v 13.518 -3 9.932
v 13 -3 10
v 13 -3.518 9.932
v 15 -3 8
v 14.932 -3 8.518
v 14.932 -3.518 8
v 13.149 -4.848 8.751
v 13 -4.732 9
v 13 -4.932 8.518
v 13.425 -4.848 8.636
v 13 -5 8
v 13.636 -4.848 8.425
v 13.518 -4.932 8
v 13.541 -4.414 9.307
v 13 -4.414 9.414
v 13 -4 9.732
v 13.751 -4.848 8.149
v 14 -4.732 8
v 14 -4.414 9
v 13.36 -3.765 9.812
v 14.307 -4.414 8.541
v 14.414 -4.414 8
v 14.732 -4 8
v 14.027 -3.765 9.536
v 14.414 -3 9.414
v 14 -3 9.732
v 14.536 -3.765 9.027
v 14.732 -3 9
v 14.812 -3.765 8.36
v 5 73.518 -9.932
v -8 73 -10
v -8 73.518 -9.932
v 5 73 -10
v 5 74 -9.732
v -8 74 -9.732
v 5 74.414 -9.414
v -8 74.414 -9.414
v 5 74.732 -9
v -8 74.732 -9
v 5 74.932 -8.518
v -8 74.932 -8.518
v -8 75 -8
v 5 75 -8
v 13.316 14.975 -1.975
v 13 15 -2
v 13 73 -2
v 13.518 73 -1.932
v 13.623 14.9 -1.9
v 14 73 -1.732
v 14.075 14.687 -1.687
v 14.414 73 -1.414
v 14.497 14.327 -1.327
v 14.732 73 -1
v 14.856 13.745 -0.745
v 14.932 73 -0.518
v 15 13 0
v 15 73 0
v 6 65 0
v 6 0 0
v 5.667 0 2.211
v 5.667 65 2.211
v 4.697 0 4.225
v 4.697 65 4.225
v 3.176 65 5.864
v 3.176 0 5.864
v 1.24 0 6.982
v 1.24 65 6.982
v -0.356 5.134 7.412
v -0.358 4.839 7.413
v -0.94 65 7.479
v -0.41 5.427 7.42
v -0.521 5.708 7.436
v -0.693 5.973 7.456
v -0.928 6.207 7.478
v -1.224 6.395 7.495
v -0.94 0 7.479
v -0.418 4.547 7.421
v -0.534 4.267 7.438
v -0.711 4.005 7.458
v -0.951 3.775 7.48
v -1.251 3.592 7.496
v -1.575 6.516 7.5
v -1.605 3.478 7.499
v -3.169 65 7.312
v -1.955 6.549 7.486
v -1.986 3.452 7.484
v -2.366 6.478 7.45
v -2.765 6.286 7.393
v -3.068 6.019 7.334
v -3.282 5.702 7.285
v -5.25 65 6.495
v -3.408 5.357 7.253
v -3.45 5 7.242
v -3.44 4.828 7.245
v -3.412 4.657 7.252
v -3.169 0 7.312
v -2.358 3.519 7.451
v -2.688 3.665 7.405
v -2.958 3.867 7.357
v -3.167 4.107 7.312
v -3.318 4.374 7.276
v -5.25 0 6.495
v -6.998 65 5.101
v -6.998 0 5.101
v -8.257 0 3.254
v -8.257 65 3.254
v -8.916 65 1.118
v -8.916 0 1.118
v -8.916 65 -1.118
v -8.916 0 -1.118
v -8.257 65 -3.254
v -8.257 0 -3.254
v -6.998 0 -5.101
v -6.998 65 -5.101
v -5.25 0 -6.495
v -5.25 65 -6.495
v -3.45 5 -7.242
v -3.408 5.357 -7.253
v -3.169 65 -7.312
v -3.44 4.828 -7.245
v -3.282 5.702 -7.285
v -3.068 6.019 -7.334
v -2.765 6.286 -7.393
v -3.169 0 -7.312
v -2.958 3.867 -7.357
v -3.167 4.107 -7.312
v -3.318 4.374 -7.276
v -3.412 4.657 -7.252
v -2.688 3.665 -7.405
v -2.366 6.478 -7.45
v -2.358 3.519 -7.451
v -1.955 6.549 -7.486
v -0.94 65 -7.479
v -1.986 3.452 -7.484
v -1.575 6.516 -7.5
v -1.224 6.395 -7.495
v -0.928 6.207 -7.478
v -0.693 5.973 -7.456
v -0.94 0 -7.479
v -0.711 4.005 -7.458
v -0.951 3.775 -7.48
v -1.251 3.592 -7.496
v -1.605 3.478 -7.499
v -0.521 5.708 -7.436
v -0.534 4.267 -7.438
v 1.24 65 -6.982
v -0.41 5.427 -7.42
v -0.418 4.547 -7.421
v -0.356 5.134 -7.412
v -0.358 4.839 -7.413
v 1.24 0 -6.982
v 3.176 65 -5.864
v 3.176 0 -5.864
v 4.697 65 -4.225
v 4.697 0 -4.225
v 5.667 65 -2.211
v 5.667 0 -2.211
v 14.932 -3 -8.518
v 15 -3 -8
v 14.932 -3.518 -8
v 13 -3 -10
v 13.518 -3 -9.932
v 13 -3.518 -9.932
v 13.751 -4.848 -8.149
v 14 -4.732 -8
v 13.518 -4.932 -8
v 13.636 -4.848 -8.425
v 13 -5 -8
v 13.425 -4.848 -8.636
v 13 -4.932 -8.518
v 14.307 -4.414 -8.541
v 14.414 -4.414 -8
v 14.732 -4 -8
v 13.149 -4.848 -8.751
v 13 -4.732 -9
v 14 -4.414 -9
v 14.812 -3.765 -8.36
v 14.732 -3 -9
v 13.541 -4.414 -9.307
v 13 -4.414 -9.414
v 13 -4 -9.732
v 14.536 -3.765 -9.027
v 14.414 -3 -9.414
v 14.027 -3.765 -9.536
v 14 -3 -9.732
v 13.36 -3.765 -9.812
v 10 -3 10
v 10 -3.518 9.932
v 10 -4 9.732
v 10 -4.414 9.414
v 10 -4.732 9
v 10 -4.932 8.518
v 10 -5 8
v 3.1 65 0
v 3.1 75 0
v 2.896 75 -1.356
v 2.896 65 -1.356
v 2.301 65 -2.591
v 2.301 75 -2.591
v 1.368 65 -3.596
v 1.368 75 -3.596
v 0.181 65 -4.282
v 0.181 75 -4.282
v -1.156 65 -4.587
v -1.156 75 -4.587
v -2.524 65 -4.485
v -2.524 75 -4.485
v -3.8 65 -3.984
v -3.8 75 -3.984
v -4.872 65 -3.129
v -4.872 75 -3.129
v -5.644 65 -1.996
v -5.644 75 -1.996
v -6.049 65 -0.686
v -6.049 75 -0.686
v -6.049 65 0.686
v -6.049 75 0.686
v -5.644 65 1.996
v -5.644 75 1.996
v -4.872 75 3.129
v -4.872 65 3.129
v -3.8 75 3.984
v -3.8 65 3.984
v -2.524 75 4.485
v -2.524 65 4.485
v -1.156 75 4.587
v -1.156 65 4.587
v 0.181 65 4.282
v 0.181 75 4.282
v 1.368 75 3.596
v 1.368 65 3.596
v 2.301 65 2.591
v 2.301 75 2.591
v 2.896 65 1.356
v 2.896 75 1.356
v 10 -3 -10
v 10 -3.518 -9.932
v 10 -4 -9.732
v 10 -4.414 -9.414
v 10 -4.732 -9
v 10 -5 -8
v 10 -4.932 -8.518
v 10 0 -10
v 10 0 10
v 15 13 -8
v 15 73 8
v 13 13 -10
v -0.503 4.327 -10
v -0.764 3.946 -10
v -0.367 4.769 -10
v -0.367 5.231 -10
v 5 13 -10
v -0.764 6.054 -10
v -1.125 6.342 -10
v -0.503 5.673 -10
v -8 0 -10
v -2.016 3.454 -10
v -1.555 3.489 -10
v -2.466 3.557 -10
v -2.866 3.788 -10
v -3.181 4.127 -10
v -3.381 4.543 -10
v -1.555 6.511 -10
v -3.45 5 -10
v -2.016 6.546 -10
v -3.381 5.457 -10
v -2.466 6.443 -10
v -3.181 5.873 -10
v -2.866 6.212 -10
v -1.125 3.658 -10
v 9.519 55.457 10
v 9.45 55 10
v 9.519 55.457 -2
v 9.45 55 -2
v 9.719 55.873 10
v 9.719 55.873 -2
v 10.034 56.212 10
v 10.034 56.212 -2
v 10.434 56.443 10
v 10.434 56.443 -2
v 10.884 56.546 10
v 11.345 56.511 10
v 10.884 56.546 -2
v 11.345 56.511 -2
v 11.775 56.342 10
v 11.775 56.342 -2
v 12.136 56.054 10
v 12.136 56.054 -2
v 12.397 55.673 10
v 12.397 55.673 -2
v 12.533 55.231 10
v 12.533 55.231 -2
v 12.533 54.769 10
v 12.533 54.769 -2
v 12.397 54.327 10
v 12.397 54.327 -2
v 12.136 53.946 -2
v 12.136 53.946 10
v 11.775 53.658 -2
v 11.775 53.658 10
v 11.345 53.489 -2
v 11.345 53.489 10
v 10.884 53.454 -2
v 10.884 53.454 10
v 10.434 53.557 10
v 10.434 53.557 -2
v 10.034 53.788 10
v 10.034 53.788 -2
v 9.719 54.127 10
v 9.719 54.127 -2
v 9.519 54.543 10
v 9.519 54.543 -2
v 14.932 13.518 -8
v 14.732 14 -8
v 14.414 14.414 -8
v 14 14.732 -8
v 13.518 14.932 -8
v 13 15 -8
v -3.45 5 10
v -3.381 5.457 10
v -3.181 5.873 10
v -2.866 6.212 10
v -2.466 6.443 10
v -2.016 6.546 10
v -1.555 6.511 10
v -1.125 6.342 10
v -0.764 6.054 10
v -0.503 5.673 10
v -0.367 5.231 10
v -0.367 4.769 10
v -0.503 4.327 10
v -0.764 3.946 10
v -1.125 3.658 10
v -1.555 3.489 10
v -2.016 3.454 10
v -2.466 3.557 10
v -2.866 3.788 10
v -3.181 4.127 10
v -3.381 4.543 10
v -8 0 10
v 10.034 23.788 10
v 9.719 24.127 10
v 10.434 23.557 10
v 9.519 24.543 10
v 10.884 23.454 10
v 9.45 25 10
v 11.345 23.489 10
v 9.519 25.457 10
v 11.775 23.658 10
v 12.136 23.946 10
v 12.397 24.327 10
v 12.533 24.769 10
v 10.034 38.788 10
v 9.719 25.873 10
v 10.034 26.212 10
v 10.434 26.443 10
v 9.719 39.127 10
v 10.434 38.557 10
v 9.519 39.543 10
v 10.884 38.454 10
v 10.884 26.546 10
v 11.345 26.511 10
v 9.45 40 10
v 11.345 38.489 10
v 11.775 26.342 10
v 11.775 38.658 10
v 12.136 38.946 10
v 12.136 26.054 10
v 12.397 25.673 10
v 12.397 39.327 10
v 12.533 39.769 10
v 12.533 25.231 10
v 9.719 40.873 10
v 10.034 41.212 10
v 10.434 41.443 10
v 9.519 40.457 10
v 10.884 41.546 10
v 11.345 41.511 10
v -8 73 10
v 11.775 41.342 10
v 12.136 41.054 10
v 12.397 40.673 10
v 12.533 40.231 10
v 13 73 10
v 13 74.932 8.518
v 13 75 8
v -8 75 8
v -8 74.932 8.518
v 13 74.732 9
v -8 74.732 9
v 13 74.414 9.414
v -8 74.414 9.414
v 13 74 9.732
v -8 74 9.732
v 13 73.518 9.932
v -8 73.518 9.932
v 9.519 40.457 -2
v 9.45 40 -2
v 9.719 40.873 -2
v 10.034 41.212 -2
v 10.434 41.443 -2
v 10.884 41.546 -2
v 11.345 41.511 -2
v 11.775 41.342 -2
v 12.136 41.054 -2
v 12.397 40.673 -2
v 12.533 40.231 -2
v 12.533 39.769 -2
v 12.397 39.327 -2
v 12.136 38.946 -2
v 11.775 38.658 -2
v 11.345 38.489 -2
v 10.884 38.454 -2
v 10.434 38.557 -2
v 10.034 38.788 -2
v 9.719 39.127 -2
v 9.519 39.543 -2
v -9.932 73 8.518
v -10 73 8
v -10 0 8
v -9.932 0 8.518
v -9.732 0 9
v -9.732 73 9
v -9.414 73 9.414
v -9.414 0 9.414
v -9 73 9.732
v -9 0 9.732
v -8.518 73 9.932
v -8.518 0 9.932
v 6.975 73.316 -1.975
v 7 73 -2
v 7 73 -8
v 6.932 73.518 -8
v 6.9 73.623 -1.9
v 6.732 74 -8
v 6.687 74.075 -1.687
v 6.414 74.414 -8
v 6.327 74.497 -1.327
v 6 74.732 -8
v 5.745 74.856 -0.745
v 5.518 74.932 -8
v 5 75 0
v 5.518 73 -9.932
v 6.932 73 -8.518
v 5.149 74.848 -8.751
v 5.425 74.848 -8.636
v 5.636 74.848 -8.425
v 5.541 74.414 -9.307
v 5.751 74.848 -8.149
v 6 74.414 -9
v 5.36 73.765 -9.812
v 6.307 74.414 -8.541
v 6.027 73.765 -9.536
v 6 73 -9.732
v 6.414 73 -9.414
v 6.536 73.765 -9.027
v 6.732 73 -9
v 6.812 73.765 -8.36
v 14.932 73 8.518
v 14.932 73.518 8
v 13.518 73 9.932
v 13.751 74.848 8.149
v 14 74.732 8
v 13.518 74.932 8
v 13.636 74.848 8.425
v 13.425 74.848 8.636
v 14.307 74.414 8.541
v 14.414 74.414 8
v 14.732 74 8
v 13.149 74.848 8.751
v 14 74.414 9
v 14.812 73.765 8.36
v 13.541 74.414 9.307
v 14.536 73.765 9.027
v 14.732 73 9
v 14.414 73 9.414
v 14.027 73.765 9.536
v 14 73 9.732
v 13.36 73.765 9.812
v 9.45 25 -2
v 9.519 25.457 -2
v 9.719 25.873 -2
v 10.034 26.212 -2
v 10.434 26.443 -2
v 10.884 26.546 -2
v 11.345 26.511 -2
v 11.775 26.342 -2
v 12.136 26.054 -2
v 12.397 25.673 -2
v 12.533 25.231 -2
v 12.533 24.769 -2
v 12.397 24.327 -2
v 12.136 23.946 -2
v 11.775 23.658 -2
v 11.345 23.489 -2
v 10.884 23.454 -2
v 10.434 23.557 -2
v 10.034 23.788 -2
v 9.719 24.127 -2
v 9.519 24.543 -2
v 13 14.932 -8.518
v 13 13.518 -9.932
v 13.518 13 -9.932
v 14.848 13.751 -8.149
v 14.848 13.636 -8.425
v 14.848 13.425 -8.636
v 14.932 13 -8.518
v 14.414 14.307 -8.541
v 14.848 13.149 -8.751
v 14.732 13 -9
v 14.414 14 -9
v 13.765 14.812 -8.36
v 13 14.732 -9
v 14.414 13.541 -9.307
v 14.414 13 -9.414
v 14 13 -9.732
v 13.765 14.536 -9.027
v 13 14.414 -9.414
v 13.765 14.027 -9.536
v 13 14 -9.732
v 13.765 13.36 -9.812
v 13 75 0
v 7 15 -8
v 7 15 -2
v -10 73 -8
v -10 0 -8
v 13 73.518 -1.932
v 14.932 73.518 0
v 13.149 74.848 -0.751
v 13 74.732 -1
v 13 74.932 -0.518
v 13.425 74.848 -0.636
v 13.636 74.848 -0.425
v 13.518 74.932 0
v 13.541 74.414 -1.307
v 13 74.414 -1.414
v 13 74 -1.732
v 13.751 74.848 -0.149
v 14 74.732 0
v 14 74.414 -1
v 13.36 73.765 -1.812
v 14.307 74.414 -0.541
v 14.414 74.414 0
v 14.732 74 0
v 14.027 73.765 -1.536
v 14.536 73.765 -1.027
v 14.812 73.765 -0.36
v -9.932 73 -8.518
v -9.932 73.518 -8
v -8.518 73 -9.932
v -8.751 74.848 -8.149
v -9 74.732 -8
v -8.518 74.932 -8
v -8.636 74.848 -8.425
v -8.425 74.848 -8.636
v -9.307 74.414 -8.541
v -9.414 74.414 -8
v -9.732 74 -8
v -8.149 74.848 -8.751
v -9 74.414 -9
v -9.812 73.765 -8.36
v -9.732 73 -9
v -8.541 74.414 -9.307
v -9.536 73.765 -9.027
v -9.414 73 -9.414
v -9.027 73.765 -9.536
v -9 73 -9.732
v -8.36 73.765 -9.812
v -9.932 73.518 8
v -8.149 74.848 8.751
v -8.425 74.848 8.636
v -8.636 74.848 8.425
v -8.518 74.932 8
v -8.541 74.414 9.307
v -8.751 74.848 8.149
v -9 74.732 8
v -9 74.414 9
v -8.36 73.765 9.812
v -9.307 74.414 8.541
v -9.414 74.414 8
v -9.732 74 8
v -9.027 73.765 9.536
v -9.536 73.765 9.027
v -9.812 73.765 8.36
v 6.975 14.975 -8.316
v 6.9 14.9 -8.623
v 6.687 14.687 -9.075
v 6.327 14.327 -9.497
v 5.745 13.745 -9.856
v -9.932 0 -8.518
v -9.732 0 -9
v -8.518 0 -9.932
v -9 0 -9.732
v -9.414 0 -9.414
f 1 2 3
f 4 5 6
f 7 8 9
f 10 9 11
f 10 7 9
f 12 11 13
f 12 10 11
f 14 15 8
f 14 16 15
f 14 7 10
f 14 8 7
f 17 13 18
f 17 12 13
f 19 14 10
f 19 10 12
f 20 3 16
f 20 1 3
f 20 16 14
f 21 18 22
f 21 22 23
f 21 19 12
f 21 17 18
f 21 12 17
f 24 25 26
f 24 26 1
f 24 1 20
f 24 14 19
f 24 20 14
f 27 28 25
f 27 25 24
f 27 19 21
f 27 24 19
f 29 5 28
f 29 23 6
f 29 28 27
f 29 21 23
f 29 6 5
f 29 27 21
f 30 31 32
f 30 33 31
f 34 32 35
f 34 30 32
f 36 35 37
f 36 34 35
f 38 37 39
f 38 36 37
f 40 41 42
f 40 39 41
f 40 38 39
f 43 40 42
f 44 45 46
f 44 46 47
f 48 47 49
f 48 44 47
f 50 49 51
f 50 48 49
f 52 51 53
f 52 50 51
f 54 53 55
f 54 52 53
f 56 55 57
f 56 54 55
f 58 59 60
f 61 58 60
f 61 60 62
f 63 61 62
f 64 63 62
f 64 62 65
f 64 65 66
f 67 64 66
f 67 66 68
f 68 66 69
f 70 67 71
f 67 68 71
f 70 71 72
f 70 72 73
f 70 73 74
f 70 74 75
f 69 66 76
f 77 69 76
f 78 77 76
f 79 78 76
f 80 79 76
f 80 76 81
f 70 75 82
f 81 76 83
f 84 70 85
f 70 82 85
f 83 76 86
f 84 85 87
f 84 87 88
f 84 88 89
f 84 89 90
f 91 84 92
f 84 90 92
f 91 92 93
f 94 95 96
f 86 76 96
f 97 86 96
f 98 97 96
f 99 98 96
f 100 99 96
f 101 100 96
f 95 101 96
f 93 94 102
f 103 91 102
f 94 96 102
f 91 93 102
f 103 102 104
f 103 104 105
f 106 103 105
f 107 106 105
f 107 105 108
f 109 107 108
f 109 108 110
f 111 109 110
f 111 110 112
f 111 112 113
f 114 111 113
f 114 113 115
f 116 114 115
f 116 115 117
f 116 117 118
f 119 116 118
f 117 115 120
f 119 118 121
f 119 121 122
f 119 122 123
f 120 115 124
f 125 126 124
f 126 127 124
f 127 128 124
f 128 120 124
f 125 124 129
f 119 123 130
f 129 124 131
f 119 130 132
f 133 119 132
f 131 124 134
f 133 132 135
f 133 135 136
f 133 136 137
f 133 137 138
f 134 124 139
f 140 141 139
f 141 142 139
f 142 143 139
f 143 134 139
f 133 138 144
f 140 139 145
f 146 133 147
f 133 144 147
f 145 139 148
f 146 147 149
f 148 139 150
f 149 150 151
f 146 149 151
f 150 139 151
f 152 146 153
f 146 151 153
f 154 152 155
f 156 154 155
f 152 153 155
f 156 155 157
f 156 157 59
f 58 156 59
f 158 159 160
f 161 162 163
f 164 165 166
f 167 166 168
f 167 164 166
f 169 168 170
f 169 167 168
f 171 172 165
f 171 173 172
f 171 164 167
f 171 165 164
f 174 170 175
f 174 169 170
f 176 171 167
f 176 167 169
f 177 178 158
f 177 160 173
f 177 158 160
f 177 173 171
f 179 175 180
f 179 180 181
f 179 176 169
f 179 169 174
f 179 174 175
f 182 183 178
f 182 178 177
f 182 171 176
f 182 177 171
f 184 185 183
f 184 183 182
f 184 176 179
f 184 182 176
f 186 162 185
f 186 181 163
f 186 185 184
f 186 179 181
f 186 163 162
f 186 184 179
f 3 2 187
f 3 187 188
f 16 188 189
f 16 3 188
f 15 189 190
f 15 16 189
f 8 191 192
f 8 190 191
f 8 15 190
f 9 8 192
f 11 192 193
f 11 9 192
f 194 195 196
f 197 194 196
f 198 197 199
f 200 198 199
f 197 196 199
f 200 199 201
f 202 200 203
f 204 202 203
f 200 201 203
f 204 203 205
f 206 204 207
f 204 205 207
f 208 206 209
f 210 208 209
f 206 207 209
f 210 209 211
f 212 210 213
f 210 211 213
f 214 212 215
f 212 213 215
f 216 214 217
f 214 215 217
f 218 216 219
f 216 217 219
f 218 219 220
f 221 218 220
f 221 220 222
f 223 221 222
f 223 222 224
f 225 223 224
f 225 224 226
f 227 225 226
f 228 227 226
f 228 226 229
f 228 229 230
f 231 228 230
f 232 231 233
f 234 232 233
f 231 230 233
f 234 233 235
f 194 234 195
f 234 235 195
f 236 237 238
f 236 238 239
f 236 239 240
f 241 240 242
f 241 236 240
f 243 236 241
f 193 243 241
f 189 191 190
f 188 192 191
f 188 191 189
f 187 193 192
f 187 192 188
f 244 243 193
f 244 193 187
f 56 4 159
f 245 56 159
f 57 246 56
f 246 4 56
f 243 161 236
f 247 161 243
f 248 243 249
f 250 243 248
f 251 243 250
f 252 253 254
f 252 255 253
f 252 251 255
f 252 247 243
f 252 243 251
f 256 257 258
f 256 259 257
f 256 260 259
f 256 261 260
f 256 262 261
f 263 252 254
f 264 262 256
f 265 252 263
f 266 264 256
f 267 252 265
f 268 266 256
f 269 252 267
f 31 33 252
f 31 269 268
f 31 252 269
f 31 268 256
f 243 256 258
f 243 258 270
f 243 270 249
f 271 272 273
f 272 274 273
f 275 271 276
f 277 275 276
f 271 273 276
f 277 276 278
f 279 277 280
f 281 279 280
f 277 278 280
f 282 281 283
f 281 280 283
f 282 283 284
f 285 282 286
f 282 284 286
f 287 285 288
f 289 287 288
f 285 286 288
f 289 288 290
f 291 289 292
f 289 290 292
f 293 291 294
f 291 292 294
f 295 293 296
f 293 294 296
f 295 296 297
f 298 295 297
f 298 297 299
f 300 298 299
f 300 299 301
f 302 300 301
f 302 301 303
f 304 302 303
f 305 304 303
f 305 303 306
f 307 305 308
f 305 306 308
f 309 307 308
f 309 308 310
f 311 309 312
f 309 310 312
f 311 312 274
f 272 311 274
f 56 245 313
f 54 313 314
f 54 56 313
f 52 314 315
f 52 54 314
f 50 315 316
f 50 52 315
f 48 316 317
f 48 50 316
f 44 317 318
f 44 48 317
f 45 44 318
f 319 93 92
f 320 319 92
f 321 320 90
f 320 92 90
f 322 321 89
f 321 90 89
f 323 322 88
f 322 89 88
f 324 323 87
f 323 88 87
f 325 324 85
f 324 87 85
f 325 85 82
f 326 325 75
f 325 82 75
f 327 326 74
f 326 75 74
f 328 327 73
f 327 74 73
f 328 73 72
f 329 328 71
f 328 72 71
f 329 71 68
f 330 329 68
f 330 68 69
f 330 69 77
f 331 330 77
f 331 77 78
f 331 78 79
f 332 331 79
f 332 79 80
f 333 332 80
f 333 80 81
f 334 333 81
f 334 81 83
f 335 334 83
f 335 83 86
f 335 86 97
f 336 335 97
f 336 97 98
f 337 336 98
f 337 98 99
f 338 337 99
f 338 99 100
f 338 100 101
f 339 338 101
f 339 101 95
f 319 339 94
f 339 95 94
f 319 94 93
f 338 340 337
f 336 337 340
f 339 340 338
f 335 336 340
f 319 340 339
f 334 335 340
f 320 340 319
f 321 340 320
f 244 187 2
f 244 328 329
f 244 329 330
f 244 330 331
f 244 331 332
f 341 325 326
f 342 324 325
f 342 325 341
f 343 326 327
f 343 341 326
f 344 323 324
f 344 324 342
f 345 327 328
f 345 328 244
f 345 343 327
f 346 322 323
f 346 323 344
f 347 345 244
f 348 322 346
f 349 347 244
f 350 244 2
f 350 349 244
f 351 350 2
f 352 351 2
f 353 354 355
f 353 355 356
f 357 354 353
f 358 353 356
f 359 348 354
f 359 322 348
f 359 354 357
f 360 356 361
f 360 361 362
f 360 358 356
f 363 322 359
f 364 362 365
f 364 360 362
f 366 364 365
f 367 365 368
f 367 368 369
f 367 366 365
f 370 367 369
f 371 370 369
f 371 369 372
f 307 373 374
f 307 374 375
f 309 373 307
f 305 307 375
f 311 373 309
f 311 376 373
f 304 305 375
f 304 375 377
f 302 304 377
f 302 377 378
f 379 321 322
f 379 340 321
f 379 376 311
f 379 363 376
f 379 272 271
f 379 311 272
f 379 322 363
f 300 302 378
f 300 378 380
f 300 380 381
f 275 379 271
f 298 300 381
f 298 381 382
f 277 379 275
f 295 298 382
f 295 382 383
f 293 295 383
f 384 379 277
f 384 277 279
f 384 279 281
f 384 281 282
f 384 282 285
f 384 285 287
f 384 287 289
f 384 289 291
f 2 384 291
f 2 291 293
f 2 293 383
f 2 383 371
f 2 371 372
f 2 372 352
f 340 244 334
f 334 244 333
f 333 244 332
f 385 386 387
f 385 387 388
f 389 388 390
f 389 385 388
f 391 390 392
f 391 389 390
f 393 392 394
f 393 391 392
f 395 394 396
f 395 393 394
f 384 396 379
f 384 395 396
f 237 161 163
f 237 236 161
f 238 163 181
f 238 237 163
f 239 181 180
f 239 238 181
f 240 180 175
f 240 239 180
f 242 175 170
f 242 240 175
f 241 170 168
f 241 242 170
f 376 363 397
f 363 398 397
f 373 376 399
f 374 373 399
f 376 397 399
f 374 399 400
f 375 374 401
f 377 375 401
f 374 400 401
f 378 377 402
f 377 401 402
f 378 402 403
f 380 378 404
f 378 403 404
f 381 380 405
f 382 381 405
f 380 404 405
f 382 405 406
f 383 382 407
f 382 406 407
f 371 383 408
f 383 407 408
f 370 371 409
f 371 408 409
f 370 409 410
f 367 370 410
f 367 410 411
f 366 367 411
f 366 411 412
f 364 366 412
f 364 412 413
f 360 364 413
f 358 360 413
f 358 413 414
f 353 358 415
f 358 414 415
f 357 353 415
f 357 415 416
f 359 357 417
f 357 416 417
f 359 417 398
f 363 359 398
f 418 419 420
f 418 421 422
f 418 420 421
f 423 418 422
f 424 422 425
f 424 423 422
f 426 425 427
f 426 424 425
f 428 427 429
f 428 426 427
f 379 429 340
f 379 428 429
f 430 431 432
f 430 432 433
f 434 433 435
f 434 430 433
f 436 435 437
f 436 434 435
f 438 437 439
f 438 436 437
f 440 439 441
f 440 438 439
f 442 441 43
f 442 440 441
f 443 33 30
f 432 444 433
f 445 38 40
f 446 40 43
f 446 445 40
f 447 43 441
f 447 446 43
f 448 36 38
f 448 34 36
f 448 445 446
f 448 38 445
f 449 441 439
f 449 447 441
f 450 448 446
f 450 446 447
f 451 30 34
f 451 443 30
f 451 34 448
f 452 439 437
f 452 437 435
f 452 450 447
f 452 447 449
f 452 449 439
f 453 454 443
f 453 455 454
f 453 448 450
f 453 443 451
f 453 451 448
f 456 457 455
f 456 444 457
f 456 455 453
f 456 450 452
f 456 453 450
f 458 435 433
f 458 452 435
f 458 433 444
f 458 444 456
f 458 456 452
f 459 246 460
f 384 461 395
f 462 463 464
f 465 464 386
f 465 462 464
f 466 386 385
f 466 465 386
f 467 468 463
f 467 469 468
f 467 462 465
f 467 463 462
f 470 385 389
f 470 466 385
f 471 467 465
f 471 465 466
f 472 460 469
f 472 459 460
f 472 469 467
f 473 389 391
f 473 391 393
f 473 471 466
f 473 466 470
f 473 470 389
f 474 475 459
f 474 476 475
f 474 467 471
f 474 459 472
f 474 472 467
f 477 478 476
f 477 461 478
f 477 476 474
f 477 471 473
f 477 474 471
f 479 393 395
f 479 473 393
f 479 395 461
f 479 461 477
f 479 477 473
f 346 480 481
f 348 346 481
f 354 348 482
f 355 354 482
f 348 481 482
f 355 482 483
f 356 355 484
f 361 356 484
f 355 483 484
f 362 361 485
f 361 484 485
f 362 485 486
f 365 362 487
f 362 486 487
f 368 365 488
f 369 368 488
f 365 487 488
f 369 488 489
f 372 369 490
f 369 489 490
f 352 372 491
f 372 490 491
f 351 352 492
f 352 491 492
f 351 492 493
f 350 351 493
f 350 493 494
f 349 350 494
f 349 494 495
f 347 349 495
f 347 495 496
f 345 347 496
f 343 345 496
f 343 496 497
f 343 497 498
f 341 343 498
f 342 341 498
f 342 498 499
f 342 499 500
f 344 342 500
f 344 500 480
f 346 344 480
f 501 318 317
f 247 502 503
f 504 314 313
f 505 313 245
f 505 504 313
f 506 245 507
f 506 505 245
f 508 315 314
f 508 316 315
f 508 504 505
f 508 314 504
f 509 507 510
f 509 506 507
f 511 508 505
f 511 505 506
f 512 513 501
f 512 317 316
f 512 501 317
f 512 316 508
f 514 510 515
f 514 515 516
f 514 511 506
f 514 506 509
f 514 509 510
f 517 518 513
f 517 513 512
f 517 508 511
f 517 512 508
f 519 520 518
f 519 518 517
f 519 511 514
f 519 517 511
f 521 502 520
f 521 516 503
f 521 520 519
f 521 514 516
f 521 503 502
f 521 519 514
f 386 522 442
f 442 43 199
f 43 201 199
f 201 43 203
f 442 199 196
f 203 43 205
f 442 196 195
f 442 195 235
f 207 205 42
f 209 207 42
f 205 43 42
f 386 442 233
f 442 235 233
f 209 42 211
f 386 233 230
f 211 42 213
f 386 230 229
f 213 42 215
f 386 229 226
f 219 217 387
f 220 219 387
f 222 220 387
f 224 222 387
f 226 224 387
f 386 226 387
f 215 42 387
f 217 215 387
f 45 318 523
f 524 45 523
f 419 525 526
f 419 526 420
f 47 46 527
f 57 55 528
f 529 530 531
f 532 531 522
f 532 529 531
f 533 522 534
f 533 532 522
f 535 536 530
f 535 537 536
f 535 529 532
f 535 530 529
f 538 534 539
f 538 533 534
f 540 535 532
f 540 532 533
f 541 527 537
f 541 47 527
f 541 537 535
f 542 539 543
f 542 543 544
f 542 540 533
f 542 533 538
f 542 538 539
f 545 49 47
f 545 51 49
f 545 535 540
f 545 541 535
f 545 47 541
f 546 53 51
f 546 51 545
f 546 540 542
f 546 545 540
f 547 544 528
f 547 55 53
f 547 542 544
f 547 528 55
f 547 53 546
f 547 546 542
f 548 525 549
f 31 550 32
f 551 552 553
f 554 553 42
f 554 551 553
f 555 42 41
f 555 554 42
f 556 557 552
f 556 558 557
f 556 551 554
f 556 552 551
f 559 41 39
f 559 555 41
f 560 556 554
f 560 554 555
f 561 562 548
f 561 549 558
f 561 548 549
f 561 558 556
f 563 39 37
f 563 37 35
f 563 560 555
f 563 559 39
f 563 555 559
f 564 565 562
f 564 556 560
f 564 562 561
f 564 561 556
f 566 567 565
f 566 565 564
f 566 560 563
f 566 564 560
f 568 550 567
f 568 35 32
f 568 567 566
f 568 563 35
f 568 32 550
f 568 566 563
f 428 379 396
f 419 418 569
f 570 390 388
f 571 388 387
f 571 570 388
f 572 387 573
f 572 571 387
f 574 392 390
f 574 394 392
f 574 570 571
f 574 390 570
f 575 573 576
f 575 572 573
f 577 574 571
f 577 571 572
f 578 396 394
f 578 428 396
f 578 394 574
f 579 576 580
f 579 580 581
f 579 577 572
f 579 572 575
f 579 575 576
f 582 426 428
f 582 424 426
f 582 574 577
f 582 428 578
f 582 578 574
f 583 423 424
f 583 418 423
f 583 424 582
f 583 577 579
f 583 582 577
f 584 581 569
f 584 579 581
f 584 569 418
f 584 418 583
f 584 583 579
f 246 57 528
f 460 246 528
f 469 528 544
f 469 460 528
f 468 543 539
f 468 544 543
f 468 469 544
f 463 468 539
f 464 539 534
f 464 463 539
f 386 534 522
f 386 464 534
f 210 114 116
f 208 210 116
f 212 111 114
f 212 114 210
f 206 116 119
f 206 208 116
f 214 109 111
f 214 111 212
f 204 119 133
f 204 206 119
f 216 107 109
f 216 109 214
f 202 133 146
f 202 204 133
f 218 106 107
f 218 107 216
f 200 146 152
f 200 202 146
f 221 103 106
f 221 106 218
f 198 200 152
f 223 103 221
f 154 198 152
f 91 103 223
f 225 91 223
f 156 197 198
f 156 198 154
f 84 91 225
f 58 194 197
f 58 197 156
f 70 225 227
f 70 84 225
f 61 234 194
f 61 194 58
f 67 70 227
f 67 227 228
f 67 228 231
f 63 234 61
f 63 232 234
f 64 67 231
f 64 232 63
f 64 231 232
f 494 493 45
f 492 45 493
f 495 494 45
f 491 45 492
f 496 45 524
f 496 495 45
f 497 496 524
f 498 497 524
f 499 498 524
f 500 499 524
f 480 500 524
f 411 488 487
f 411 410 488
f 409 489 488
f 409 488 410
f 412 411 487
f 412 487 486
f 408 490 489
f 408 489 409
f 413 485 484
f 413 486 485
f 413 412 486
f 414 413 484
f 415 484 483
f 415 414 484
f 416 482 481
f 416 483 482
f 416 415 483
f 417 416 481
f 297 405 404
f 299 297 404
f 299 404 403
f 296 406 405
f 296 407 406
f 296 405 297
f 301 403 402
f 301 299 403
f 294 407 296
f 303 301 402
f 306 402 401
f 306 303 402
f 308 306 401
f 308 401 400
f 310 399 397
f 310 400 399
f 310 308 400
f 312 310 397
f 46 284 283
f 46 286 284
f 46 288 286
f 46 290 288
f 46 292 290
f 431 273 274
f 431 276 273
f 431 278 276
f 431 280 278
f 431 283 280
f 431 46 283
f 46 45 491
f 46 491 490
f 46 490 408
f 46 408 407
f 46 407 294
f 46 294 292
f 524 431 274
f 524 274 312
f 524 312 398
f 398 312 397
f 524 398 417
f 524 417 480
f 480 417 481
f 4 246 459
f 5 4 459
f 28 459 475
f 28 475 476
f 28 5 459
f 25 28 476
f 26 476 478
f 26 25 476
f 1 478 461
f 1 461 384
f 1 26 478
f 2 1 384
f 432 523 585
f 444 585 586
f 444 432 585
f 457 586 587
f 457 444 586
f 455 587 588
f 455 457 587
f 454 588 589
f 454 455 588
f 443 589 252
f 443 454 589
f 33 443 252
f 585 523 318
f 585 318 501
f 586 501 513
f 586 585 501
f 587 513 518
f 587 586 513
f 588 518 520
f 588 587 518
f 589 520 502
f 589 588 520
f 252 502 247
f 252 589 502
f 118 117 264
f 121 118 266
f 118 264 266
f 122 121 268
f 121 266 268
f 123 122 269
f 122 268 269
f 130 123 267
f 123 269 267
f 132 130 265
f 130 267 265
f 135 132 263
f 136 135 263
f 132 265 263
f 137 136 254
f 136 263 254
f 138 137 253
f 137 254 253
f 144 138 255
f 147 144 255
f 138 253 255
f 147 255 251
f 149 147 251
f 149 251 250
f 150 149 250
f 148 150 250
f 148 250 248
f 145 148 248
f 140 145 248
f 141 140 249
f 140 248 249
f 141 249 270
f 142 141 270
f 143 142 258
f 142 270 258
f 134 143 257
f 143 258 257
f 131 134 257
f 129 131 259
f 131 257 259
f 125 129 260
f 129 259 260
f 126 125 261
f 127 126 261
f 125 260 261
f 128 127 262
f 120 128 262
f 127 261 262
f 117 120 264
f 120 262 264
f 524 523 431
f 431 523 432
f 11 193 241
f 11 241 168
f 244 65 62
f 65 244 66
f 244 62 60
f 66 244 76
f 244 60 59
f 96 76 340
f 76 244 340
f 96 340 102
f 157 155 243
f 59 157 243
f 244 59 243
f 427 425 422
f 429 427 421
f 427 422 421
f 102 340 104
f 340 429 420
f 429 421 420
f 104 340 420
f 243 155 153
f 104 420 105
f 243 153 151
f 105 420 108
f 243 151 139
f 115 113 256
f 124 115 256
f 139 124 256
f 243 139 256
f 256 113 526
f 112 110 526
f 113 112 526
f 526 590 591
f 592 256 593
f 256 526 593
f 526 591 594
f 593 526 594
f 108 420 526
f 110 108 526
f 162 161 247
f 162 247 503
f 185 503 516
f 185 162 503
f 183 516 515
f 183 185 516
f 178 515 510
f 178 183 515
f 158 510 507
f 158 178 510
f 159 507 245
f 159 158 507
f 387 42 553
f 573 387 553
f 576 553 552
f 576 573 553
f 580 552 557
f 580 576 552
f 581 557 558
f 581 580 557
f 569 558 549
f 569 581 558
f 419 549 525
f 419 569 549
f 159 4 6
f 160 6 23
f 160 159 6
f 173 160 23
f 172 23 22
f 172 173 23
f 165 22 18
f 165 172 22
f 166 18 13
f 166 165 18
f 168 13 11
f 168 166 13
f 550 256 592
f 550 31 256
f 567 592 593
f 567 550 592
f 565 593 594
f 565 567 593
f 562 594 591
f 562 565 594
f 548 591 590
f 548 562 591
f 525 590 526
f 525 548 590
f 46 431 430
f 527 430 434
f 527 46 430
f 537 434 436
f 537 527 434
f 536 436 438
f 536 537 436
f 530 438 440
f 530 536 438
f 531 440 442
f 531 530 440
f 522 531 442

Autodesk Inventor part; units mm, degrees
ref_plane "YZ Plane" through (0, 0, 0) normal (1, 0, 0) x (0, 1, 0)
ref_plane "XZ Plane" through (0, 0, 0) normal (0, 1, 0) x (-1, 0, 0)
ref_plane "XY Plane" through (0, 0, 0) normal (0, 0, 1) x (1, 0, 0)
sketch "Sketch1" plane through (0, 0, 0) normal (0, 1, 0) x (-1, 0, 0)
  line L0 (10, 10) -> (-10, 10)
  line L1 (-10, 10) -> (-10, -10)
  line L2 (-10, -10) -> (10, -10)
  line L3 (10, -10) -> (10, 10)
  line L4 (10, 10) -> (-10, -10) construction
  line L5 (-10, 10) -> (10, -10) construction
  point P0 (0, 0)
  dimension "d0" = 20
  dimension "d1" = 20
extrude "Extrusion1" add sketch "Sketch1" along normal blind 75
sketch "Sketch2" plane through (0, 75, 0) normal (0, 1, 0) x (1, 0, 0)
  circle A0 centre (-1.5, 0) radius 4.6
  line L0 (-10, -10) -> (10, -10) projected
  line L1 (-10, 10) -> (-10, -10) projected
  dimension "d4" = 9.2
  dimension "d25" = 10
  dimension "d26" = 8.5
extrude "Extrusion2" cut sketch "Sketch2" against normal blind 10
sketch "Sketch3" plane through (0, 0, 0) normal (0, -1, 0) x (1, 0, 0)
  circle A0 centre (-1.5, 0) radius 7.5
  line L0 (10, -10) -> (-10, -10) projected
  line L1 (-10, -10) -> (-10, 10) projected
  dimension "d7" = 15
  dimension "d27" = 10
  dimension "d28" = 8.5
extrude "Extrusion3" cut sketch "Sketch3" against normal blind 65
sketch "Sketch5" plane through (10, 0, 10) normal (1, 0, 0) x (0, 0, -1)
  line L0 (20, 75) -> (0, 75)
  line L1 (0, 75) -> (0, 0)
  line L2 (0, 0) -> (20, 0)
  line L3 (20, 0) -> (20, 75)
  line L4 (20, 0) -> (20, 75) projected
  line L5 (0, 0) -> (20, 0) projected
  line L6 (0, 75) -> (20, 75) projected
  line L7 (0, 0) -> (0, 75) projected
  point P0 (10, 0)
extrude "Extrusion5" add sketch "Sketch5" along normal blind 5
sketch "Sketch7" plane through (-10, 0, -10) normal (0, 0, -1) x (-1, 0, 0)
  circle A0 centre (-21, 55) radius 1.55
  circle A1 centre (-21, 40) radius 1.55
  circle A2 centre (-21, 25) radius 1.55
  line L0 (0, 75) -> (-25, 75) projected
  line L1 (-25, 0) -> (-25, 75) projected
  point P0 (-10, 0)
  dimension "d16" = 3.1
  dimension "d17" = 3.1
  dimension "d18" = 3.1
  dimension "d19" = 20
  dimension "d20" = 15
  dimension "d21" = 15
  dimension "d22" = 4
extrude "Extrusion6" cut sketch "Sketch7" against normal blind 20
sketch "Sketch8" plane through (-10, 0, -10) normal (0, 0, -1) x (-1, 0, 0)
  line L0 (-17, 75) -> (-25, 75)
  line L1 (-25, 75) -> (-25, 15)
  line L2 (-25, 15) -> (-17, 15)
  line L3 (-17, 15) -> (-17, 75)
  line L4 (0, 0) -> (-25, 0) projected
  line L5 (0, 75) -> (-25, 75) projected
  line L6 (-25, 0) -> (-25, 75) projected
  point P0 (-10, 0)
  dimension "d29" = 8
  dimension "d32" = 15
extrude "Extrusion7" cut sketch "Sketch8" against normal blind 8
sketch "Sketch9" plane through (-10, 0, -10) normal (0, 0, -1) x (-1, 0, 0)
  circle A0 centre (-8.1, 5) radius 1.55
  line L0 (0, 0) -> (0, 75) projected
  line L1 (0, 0) -> (-25, 0) projected
  point P0 (-10, 0)
  dimension "d33" = 3.1
  dimension "d34" = 8.1
  dimension "d35" = 5
extrude "Extrusion8" cut sketch "Sketch9" against normal through all
sketch "Sketch10" plane through (0, 0, 0) normal (0, -1, 0) x (1, 0, 0)
  line L0 (15, -10) -> (10, -10)
  line L1 (10, -10) -> (10, 10)
  line L2 (10, 10) -> (15, 10)
  line L3 (15, 10) -> (15, -10)
  line L4 (-10, -10) -> (15, -10) projected
  line L5 (-10, 10) -> (15, 10) projected
  line L6 (15, 10) -> (15, -10) projected
  point P0 (0, 0)
  dimension "d38" = 5
extrude "Extrusion9" add sketch "Sketch10" along normal blind 5
fillet "Fillet1" radius 2 17 edges at (15, 35, 10) (-10, 37.5, 10) (15, 45, -2) (7, 45, -10) (-10, 37.5, -10) (-1.5, 75, -10) (7, 75, -6) (11, 75, -2) (15, 75, 4) (2.5, 75, 10) (-10, 75, 0) (11, 15, -10) (15, 15, -6) (15, 5, -10) (15, -5, 0) (12.5, -5, -10) (12.5, -5, 10)
properties part number "finger2" material "ABS Plastic"
